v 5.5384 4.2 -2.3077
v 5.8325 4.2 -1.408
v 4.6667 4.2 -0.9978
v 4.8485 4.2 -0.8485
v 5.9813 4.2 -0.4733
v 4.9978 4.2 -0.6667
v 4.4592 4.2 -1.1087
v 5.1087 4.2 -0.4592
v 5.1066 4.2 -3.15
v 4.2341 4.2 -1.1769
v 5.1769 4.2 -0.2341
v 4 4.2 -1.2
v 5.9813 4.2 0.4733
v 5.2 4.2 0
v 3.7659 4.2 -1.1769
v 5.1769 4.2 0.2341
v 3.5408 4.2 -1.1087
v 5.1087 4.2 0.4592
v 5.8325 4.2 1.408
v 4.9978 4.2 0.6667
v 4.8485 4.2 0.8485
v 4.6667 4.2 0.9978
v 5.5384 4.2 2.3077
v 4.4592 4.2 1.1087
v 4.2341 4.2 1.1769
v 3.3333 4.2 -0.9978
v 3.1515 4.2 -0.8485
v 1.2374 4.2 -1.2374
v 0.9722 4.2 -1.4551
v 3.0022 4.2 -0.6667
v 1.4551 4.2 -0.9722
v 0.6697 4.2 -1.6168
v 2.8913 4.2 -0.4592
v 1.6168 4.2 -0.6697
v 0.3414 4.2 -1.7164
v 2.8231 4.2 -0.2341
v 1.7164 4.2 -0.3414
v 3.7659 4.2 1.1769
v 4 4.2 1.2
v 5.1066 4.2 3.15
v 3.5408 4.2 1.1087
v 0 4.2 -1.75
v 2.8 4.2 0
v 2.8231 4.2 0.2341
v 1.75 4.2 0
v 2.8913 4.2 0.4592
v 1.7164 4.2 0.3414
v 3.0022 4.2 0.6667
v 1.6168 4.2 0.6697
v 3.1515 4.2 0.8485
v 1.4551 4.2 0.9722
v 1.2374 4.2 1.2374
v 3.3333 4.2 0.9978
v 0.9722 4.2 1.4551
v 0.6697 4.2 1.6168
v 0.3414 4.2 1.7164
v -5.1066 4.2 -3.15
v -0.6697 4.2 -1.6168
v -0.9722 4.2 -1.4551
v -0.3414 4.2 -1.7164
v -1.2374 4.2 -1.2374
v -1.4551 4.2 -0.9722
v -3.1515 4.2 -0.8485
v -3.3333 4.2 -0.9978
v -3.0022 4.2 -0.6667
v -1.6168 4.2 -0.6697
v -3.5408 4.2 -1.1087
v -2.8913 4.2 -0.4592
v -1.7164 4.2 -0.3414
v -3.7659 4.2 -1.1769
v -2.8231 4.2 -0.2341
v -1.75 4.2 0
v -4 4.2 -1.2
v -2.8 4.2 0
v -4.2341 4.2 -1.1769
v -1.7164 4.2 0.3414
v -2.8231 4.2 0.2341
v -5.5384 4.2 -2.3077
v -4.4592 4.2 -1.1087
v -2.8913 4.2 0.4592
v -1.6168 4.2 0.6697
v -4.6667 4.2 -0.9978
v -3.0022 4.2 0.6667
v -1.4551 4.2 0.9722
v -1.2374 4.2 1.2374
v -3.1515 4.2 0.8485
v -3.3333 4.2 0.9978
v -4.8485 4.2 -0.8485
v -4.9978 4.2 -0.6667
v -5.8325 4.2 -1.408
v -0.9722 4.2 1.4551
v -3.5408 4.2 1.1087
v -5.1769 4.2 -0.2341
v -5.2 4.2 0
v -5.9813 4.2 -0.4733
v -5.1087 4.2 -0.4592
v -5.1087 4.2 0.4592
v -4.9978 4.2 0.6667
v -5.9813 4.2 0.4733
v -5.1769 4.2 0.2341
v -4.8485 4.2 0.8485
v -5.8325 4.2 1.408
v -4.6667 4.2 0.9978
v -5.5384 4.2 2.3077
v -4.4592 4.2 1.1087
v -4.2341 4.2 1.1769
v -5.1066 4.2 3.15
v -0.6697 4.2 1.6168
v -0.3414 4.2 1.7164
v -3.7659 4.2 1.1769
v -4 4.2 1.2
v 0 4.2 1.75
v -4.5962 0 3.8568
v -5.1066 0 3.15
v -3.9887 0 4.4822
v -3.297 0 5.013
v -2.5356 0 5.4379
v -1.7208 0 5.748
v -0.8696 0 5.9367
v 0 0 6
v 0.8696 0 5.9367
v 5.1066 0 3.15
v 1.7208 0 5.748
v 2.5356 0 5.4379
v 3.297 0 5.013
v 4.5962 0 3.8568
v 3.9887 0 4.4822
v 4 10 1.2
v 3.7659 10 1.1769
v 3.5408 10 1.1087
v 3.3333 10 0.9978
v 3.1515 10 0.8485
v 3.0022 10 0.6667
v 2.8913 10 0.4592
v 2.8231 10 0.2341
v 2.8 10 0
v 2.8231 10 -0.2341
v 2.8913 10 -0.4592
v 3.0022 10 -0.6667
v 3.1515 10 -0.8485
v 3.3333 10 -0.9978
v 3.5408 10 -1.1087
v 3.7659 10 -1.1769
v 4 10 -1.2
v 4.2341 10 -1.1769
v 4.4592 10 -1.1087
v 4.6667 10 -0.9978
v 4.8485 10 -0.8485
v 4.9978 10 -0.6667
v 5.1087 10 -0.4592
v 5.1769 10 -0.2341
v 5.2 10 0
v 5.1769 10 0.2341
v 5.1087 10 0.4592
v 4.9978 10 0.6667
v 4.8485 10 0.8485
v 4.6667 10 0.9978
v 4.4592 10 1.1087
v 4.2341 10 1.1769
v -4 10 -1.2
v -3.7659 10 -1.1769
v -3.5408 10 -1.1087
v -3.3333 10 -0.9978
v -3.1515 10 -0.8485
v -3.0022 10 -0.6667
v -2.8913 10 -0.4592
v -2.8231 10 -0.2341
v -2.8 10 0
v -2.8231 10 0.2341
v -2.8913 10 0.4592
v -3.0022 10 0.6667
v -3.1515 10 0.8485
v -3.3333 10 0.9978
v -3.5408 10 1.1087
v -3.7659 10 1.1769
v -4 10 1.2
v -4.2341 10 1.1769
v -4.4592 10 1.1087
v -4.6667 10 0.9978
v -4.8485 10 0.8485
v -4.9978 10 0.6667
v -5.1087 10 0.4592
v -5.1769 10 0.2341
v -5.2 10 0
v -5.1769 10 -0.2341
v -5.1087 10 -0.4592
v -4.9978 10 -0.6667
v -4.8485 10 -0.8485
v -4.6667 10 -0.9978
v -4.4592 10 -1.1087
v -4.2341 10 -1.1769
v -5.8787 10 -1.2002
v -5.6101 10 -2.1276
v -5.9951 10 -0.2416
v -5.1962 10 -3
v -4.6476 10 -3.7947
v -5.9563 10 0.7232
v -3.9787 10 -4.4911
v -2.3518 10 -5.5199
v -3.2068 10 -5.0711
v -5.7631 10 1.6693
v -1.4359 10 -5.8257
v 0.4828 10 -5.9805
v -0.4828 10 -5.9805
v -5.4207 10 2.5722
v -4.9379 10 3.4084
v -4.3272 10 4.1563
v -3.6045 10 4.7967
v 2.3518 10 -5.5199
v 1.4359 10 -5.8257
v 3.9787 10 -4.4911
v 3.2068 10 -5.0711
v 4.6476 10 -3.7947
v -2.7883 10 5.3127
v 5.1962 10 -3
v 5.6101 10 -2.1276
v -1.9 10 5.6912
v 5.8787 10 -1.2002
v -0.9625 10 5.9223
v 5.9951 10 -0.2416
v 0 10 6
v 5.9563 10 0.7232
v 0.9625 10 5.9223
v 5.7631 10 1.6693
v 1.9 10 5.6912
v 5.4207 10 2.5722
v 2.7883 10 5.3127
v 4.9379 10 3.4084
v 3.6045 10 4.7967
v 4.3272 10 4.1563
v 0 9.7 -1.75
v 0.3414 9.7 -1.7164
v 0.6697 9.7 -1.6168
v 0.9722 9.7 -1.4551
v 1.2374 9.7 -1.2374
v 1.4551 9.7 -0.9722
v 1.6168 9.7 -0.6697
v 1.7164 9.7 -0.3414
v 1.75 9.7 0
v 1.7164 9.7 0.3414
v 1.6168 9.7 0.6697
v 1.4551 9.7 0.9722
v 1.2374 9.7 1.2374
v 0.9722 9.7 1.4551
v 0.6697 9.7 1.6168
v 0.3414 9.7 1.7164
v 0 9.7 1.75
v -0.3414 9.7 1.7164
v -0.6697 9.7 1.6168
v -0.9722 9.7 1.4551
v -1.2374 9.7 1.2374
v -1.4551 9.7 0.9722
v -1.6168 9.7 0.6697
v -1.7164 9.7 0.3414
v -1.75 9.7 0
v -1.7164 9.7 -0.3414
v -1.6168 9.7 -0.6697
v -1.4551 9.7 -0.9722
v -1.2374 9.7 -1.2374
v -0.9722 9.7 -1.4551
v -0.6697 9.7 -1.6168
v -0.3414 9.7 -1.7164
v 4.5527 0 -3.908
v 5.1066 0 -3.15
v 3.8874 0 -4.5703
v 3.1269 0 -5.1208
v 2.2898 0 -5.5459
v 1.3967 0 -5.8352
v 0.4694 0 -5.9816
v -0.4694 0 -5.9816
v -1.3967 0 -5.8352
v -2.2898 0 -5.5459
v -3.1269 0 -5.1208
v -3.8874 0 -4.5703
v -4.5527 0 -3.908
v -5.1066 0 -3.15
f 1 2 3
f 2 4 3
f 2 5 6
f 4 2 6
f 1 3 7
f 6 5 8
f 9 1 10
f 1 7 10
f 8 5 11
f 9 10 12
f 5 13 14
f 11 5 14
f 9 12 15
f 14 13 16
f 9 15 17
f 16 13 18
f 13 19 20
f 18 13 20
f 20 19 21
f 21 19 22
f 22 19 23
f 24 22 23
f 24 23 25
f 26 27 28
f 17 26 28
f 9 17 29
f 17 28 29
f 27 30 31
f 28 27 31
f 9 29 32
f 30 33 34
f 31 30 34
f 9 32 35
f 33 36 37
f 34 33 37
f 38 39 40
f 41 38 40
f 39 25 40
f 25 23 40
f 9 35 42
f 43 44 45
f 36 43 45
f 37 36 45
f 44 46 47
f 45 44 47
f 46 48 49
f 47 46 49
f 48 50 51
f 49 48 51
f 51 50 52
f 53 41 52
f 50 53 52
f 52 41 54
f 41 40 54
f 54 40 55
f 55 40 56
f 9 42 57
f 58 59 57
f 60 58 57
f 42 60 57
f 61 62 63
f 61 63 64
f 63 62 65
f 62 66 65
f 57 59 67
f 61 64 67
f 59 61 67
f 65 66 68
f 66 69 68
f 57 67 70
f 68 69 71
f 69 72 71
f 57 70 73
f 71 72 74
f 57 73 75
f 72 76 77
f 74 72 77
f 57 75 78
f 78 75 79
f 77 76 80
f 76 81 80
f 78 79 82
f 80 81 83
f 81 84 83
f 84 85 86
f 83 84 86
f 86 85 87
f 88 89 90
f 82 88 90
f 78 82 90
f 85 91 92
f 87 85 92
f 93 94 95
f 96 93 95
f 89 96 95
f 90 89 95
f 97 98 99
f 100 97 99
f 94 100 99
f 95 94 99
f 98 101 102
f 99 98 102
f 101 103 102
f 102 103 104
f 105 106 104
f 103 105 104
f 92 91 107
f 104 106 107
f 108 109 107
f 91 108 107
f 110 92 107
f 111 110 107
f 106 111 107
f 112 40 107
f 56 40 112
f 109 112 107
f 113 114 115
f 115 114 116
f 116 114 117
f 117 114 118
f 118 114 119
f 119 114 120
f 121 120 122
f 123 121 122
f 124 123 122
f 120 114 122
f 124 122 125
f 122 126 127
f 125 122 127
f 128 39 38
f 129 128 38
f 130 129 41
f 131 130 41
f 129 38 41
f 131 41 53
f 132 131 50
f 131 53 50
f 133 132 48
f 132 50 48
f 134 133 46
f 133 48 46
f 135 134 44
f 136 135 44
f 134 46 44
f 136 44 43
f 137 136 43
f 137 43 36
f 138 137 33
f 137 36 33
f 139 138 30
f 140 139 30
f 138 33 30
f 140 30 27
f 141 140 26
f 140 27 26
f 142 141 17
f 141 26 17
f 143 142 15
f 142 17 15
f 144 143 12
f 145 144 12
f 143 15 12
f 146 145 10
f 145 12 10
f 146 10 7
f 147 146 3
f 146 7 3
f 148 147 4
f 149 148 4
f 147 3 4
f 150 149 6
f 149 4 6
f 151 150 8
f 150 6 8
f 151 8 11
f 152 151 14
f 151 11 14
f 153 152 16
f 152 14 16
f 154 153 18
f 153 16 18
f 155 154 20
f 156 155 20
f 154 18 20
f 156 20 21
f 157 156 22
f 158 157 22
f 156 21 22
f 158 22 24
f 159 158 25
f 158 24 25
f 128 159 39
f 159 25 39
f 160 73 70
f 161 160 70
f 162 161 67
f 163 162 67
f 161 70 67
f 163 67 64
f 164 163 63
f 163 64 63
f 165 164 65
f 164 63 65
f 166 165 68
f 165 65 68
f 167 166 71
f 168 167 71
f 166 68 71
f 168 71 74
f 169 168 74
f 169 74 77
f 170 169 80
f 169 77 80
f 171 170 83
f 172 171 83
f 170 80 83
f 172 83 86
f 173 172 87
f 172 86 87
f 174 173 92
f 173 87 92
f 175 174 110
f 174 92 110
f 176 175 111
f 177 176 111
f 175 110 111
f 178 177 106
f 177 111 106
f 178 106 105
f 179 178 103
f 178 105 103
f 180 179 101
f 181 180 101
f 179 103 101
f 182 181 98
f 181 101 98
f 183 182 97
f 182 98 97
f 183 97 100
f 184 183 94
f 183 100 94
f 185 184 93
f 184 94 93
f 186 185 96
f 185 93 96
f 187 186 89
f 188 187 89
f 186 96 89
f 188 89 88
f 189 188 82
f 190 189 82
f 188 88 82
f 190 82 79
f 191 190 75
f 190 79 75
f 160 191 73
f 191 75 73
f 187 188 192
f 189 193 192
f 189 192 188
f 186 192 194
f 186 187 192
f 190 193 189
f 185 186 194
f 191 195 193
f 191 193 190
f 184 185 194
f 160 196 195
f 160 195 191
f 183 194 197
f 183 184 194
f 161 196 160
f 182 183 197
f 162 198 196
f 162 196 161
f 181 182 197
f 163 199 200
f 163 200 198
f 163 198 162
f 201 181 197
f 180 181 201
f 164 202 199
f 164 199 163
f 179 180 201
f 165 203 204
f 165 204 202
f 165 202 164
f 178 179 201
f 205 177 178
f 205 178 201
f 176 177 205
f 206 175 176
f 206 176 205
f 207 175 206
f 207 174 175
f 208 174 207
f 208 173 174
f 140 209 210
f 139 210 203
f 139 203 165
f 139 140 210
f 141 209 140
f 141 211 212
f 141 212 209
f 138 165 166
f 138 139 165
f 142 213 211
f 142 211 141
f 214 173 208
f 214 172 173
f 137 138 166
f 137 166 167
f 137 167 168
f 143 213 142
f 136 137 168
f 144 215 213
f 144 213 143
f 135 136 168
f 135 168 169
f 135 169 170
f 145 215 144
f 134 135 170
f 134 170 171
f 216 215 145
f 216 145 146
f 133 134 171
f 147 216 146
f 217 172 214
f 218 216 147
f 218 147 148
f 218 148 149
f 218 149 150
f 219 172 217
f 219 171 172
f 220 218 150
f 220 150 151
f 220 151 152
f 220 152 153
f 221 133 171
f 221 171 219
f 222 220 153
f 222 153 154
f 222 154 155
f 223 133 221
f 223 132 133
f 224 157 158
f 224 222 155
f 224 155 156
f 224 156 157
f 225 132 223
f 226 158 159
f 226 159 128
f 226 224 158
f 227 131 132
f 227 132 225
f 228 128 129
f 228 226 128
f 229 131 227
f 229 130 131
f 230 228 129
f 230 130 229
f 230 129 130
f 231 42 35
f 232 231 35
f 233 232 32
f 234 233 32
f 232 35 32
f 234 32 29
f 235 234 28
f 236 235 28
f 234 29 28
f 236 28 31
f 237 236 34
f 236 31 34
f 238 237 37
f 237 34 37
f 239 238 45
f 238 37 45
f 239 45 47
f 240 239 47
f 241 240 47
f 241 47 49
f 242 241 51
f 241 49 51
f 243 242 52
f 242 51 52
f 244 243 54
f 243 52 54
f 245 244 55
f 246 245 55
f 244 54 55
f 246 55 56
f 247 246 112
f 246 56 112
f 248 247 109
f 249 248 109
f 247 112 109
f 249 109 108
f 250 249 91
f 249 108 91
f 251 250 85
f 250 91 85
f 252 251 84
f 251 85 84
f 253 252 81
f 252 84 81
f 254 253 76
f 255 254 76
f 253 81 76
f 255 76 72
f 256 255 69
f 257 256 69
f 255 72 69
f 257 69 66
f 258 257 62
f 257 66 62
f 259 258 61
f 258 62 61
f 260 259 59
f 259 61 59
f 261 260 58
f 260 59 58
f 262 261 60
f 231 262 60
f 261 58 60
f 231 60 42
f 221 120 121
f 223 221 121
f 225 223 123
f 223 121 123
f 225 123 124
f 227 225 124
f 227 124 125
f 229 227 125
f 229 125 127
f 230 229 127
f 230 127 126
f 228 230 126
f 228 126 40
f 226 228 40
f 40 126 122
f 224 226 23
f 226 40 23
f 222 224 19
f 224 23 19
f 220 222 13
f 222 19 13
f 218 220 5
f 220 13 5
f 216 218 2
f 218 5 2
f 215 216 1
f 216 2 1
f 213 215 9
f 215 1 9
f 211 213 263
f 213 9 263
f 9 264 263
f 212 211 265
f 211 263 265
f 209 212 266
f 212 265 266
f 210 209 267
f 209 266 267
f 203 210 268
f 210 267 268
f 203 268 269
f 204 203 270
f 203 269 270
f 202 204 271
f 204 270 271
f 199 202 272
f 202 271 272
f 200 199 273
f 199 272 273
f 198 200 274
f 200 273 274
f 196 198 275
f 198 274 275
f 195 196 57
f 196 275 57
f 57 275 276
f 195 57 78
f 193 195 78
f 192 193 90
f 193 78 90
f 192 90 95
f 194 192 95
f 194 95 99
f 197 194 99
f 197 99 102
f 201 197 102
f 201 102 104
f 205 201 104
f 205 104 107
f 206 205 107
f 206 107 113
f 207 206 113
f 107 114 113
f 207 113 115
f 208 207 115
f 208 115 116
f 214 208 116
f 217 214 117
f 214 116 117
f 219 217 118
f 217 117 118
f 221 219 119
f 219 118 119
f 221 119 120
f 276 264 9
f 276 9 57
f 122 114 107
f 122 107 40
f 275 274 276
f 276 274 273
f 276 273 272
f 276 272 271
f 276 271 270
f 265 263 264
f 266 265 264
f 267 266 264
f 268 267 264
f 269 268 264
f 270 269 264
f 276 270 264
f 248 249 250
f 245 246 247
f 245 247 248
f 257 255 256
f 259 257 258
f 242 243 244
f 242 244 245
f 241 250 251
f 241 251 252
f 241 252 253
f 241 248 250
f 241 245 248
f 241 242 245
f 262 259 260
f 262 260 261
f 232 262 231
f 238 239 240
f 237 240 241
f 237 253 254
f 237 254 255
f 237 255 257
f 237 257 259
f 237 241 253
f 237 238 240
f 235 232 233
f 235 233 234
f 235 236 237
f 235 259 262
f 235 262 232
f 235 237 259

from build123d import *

# Parameters (mm, degrees)
SKETCH_1_R          = 6
EXTRUDE_1_DEPTH     = 10
CUT_EXTRUDE_1_DEPTH = 4.2
SKETCH_3_R          = 1.75
CUT_EXTRUDE_2_DEPTH = 5.5
SKETCH_4_R          = 1.2
CUT_EXTRUDE_3_DEPTH = 5.8


with BuildPart() as part:
    # Эскиз1 → Бобышка-Вытянуть1 (new body)
    with BuildSketch(Plane(origin=(0, 0, 0), x_dir=(1, 0, 0), z_dir=(0, 1, 0))):
        with Locations(Location((0, 0, 0), (0, 0, 270))):
            Circle(SKETCH_1_R)
    extrude(amount=EXTRUDE_1_DEPTH)

    # Эскиз2 → Вырез-Вытянуть1 (cut)
    with BuildSketch(Plane.XZ):
        with BuildLine():
            Line((-5.106613359, 3.15), (5.106613359, 3.15))
            ThreePointArc((5.106613359, 3.15), (6, 0), (5.106613359, -3.15))
            Line((5.106613359, -3.15), (-5.106613359, -3.15))
            ThreePointArc((-5.106613359, -3.15), (-6, 0), (-5.106613359, 3.15))
        make_face()
    extrude(amount=-CUT_EXTRUDE_1_DEPTH, mode=Mode.SUBTRACT)

    # Эскиз3 → Вырез-Вытянуть2 (cut)
    with BuildSketch(Plane.XZ.offset(-4.2)):
        with Locations(Location((0, 0, 0), (0, 0, 270))):
            Circle(SKETCH_3_R)
    extrude(amount=-CUT_EXTRUDE_2_DEPTH, mode=Mode.SUBTRACT)

    # Эскиз4 → Вырез-Вытянуть3 (cut)
    with BuildSketch(Plane.XZ.offset(-4.2)):
        with Locations(Location((-4, 0, 0), (0, 0, 270))):
            Circle(SKETCH_4_R)
        with Locations(Location((4, 0, 0), (0, 0, 90))):
            Circle(SKETCH_4_R)
    extrude(amount=-CUT_EXTRUDE_3_DEPTH, mode=Mode.SUBTRACT)


solid = part.part
